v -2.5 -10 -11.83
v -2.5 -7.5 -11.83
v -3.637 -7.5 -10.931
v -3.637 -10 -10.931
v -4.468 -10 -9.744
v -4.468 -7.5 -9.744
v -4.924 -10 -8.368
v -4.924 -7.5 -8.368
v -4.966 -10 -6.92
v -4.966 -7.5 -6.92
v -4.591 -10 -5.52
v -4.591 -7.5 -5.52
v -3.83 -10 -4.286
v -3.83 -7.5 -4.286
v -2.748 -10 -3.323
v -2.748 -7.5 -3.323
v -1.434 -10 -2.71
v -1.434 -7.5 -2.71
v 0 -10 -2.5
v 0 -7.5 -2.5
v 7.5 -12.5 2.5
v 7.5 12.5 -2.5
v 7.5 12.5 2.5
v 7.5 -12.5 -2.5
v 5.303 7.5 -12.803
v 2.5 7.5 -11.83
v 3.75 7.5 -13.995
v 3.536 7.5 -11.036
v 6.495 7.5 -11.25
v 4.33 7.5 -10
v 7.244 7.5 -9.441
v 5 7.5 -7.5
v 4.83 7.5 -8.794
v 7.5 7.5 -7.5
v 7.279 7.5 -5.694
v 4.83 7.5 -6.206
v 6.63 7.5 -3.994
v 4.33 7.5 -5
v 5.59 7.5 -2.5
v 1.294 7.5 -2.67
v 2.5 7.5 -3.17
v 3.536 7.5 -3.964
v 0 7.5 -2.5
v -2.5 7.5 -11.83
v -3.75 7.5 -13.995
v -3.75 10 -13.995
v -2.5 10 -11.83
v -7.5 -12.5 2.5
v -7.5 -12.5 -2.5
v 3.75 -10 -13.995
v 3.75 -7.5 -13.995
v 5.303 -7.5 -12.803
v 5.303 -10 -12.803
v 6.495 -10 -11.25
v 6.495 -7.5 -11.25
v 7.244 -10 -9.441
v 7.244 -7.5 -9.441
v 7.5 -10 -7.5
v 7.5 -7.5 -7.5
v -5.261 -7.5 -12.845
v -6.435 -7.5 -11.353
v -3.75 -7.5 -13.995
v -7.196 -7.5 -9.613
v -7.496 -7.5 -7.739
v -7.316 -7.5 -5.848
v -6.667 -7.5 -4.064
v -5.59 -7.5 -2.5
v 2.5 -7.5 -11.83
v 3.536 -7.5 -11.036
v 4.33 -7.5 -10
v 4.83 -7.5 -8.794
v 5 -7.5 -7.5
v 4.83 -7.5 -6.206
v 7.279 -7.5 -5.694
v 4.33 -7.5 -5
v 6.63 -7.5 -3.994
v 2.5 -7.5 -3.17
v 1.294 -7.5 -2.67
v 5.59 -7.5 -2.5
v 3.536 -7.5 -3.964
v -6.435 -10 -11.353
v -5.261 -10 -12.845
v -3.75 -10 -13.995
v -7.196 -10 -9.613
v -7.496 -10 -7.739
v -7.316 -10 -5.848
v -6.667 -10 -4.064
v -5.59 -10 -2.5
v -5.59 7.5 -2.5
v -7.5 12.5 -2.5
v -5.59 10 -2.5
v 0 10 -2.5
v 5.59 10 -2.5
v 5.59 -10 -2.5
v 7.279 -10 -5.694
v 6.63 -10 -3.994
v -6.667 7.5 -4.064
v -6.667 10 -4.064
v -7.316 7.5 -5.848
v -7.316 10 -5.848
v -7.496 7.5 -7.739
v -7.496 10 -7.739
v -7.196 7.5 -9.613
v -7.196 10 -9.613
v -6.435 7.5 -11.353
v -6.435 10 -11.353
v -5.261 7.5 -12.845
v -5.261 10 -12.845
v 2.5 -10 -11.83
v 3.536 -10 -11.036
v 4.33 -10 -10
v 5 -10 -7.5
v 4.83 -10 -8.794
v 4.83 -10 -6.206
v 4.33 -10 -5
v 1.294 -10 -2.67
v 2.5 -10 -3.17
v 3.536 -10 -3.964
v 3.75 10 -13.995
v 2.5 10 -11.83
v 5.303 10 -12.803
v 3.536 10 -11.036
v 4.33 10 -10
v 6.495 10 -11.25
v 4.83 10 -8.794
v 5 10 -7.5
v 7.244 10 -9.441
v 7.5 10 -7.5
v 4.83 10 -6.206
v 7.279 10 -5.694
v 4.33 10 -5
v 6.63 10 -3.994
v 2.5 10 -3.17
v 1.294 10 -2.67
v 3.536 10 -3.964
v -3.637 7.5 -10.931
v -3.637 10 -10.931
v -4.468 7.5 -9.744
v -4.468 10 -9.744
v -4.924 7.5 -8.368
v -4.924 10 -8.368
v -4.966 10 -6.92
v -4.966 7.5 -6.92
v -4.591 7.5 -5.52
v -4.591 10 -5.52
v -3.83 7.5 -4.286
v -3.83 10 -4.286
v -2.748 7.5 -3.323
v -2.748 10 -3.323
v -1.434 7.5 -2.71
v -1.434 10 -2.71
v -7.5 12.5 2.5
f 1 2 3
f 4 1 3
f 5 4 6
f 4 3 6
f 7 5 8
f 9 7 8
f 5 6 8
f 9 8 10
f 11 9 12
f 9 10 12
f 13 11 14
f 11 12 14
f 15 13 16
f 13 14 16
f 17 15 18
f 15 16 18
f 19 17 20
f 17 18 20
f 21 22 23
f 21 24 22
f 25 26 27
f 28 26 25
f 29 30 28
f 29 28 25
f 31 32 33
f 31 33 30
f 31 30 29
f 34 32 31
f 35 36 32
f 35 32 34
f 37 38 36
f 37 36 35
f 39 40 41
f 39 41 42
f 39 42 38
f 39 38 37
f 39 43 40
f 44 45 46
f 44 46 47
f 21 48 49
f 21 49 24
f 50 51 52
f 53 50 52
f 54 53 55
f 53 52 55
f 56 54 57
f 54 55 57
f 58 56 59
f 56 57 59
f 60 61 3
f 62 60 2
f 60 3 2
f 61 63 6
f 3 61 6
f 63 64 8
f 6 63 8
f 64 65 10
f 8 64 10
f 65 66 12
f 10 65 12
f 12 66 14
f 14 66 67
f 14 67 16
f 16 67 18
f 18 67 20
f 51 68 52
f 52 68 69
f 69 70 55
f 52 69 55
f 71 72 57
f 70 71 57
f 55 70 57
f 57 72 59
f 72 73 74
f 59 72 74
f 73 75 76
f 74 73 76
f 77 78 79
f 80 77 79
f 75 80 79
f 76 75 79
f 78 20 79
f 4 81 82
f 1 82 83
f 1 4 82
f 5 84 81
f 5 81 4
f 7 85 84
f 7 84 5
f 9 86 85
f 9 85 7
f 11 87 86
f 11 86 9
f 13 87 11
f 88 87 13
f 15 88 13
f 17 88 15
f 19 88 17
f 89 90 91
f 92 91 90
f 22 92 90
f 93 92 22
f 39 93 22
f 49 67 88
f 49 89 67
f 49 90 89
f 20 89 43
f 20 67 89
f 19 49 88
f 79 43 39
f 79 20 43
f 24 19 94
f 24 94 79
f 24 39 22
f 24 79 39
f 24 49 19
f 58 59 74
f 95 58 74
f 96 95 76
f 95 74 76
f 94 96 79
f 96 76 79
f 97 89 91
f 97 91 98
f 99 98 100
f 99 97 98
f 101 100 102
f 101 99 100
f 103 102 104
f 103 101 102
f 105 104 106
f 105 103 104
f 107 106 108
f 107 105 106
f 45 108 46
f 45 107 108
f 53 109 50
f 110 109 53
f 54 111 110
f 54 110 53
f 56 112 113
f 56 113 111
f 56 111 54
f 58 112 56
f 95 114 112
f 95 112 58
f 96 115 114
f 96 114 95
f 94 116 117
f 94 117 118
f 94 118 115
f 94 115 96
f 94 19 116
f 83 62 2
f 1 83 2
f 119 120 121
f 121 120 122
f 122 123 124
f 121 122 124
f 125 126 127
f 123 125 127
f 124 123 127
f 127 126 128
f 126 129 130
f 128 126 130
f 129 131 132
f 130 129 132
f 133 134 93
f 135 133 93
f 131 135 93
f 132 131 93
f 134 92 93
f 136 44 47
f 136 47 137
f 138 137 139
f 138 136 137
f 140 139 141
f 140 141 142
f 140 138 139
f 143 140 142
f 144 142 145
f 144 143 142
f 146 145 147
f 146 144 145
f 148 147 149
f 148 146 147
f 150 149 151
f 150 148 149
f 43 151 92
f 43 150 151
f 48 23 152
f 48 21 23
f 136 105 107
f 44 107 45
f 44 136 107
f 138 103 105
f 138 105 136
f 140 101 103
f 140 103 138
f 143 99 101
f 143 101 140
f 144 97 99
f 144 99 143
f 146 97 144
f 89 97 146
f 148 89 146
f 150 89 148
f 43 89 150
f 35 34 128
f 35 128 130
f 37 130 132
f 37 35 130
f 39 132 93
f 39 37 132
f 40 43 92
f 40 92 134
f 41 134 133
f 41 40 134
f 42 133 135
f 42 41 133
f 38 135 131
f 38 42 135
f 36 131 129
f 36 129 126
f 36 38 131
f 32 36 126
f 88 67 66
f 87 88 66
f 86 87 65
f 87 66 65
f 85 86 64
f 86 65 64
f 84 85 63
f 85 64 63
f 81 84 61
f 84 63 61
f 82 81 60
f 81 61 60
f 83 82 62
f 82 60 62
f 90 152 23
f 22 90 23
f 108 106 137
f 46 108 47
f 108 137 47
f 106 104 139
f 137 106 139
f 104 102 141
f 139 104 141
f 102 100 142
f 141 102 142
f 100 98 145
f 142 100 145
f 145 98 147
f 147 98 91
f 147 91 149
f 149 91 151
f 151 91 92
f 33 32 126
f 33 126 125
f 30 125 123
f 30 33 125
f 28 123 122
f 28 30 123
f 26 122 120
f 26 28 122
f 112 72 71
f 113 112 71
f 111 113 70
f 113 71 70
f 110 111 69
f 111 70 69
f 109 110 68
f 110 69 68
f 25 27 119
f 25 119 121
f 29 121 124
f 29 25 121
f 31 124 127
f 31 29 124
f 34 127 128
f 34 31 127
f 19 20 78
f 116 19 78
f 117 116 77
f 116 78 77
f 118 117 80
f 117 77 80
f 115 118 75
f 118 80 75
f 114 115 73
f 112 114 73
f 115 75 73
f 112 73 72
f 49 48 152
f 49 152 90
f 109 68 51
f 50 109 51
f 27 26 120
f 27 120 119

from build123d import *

# Parameters (mm, degrees)
F1_DEPTH = 12.5
F2_START = 7.5
F2_DEPTH = 2.5
F3_START = -7.5
F3_DEPTH = 2.5


with BuildPart() as f1:
    # F0 (on Front) → F1 (new body, symmetric)
    with BuildSketch(Plane.XZ):
        with BuildLine():
            Line((7.5, 2.5), (-7.5, 2.5))
            Line((-7.5, 2.5), (-7.5, -2.5))
            Line((-7.5, -2.5), (-5.5901699437, -2.5))
            ThreePointArc((-5.5901699437, -2.5), (0, 0), (5.5901699437, -2.5))
            Line((5.5901699437, -2.5), (7.5, -2.5))
            Line((7.5, -2.5), (7.5, 2.5))
        make_face()
        with BuildLine():
            ThreePointArc((5.5901699437, -2.5), (0, 0), (-5.5901699437, -2.5))
            Line((-5.5901699437, -2.5), (0, -2.5))
            Line((0, -2.5), (5.5901699437, -2.5))
        make_face()
    extrude(amount=F1_DEPTH, both=True)

    # F0 (on Front) → F2 (join)
    with BuildSketch(Plane.XZ.offset(F2_START)):
        with BuildLine():
            Line((0, -2.5), (-5.5901699437, -2.5))
            ThreePointArc((-5.5901699437, -2.5), (-7.4057102945, -8.6855188883), (-3.75, -13.9951905284))
            Line((-3.75, -13.9951905284), (-2.5, -11.8301270189))
            ThreePointArc((-2.5, -11.8301270189), (-4.8296291314, -6.2059047745), (0, -2.5))
        make_face()
        with BuildLine():
            ThreePointArc((7.5, -7.5), (7.0062926922, -4.8238343267), (5.5901699437, -2.5))
            Line((5.5901699437, -2.5), (0, -2.5))
            ThreePointArc((0, -2.5), (3.5355339059, -3.9644660941), (5, -7.5))
            ThreePointArc((5, -7.5), (4.3301270189, -10), (2.5, -11.8301270189))
            Line((2.5, -11.8301270189), (3.75, -13.9951905284))
            ThreePointArc((3.75, -13.9951905284), (6.4951905284, -11.25), (7.5, -7.5))
        make_face()
    extrude(amount=F2_DEPTH)

    # F0 (on Front) → F3 (join)
    with BuildSketch(Plane.XZ.offset(F3_START)):
        with BuildLine():
            ThreePointArc((7.5, -7.5), (7.0062926922, -4.8238343267), (5.5901699437, -2.5))
            Line((5.5901699437, -2.5), (0, -2.5))
            ThreePointArc((0, -2.5), (3.5355339059, -3.9644660941), (5, -7.5))
            ThreePointArc((5, -7.5), (4.3301270189, -10), (2.5, -11.8301270189))
            Line((2.5, -11.8301270189), (3.75, -13.9951905284))
            ThreePointArc((3.75, -13.9951905284), (6.4951905284, -11.25), (7.5, -7.5))
        make_face()
        with BuildLine():
            Line((0, -2.5), (-5.5901699437, -2.5))
            ThreePointArc((-5.5901699437, -2.5), (-7.4057102945, -8.6855188883), (-3.75, -13.9951905284))
            Line((-3.75, -13.9951905284), (-2.5, -11.8301270189))
            ThreePointArc((-2.5, -11.8301270189), (-4.8296291314, -6.2059047745), (0, -2.5))
        make_face()
    extrude(amount=-F3_DEPTH)


solid = f1.part
